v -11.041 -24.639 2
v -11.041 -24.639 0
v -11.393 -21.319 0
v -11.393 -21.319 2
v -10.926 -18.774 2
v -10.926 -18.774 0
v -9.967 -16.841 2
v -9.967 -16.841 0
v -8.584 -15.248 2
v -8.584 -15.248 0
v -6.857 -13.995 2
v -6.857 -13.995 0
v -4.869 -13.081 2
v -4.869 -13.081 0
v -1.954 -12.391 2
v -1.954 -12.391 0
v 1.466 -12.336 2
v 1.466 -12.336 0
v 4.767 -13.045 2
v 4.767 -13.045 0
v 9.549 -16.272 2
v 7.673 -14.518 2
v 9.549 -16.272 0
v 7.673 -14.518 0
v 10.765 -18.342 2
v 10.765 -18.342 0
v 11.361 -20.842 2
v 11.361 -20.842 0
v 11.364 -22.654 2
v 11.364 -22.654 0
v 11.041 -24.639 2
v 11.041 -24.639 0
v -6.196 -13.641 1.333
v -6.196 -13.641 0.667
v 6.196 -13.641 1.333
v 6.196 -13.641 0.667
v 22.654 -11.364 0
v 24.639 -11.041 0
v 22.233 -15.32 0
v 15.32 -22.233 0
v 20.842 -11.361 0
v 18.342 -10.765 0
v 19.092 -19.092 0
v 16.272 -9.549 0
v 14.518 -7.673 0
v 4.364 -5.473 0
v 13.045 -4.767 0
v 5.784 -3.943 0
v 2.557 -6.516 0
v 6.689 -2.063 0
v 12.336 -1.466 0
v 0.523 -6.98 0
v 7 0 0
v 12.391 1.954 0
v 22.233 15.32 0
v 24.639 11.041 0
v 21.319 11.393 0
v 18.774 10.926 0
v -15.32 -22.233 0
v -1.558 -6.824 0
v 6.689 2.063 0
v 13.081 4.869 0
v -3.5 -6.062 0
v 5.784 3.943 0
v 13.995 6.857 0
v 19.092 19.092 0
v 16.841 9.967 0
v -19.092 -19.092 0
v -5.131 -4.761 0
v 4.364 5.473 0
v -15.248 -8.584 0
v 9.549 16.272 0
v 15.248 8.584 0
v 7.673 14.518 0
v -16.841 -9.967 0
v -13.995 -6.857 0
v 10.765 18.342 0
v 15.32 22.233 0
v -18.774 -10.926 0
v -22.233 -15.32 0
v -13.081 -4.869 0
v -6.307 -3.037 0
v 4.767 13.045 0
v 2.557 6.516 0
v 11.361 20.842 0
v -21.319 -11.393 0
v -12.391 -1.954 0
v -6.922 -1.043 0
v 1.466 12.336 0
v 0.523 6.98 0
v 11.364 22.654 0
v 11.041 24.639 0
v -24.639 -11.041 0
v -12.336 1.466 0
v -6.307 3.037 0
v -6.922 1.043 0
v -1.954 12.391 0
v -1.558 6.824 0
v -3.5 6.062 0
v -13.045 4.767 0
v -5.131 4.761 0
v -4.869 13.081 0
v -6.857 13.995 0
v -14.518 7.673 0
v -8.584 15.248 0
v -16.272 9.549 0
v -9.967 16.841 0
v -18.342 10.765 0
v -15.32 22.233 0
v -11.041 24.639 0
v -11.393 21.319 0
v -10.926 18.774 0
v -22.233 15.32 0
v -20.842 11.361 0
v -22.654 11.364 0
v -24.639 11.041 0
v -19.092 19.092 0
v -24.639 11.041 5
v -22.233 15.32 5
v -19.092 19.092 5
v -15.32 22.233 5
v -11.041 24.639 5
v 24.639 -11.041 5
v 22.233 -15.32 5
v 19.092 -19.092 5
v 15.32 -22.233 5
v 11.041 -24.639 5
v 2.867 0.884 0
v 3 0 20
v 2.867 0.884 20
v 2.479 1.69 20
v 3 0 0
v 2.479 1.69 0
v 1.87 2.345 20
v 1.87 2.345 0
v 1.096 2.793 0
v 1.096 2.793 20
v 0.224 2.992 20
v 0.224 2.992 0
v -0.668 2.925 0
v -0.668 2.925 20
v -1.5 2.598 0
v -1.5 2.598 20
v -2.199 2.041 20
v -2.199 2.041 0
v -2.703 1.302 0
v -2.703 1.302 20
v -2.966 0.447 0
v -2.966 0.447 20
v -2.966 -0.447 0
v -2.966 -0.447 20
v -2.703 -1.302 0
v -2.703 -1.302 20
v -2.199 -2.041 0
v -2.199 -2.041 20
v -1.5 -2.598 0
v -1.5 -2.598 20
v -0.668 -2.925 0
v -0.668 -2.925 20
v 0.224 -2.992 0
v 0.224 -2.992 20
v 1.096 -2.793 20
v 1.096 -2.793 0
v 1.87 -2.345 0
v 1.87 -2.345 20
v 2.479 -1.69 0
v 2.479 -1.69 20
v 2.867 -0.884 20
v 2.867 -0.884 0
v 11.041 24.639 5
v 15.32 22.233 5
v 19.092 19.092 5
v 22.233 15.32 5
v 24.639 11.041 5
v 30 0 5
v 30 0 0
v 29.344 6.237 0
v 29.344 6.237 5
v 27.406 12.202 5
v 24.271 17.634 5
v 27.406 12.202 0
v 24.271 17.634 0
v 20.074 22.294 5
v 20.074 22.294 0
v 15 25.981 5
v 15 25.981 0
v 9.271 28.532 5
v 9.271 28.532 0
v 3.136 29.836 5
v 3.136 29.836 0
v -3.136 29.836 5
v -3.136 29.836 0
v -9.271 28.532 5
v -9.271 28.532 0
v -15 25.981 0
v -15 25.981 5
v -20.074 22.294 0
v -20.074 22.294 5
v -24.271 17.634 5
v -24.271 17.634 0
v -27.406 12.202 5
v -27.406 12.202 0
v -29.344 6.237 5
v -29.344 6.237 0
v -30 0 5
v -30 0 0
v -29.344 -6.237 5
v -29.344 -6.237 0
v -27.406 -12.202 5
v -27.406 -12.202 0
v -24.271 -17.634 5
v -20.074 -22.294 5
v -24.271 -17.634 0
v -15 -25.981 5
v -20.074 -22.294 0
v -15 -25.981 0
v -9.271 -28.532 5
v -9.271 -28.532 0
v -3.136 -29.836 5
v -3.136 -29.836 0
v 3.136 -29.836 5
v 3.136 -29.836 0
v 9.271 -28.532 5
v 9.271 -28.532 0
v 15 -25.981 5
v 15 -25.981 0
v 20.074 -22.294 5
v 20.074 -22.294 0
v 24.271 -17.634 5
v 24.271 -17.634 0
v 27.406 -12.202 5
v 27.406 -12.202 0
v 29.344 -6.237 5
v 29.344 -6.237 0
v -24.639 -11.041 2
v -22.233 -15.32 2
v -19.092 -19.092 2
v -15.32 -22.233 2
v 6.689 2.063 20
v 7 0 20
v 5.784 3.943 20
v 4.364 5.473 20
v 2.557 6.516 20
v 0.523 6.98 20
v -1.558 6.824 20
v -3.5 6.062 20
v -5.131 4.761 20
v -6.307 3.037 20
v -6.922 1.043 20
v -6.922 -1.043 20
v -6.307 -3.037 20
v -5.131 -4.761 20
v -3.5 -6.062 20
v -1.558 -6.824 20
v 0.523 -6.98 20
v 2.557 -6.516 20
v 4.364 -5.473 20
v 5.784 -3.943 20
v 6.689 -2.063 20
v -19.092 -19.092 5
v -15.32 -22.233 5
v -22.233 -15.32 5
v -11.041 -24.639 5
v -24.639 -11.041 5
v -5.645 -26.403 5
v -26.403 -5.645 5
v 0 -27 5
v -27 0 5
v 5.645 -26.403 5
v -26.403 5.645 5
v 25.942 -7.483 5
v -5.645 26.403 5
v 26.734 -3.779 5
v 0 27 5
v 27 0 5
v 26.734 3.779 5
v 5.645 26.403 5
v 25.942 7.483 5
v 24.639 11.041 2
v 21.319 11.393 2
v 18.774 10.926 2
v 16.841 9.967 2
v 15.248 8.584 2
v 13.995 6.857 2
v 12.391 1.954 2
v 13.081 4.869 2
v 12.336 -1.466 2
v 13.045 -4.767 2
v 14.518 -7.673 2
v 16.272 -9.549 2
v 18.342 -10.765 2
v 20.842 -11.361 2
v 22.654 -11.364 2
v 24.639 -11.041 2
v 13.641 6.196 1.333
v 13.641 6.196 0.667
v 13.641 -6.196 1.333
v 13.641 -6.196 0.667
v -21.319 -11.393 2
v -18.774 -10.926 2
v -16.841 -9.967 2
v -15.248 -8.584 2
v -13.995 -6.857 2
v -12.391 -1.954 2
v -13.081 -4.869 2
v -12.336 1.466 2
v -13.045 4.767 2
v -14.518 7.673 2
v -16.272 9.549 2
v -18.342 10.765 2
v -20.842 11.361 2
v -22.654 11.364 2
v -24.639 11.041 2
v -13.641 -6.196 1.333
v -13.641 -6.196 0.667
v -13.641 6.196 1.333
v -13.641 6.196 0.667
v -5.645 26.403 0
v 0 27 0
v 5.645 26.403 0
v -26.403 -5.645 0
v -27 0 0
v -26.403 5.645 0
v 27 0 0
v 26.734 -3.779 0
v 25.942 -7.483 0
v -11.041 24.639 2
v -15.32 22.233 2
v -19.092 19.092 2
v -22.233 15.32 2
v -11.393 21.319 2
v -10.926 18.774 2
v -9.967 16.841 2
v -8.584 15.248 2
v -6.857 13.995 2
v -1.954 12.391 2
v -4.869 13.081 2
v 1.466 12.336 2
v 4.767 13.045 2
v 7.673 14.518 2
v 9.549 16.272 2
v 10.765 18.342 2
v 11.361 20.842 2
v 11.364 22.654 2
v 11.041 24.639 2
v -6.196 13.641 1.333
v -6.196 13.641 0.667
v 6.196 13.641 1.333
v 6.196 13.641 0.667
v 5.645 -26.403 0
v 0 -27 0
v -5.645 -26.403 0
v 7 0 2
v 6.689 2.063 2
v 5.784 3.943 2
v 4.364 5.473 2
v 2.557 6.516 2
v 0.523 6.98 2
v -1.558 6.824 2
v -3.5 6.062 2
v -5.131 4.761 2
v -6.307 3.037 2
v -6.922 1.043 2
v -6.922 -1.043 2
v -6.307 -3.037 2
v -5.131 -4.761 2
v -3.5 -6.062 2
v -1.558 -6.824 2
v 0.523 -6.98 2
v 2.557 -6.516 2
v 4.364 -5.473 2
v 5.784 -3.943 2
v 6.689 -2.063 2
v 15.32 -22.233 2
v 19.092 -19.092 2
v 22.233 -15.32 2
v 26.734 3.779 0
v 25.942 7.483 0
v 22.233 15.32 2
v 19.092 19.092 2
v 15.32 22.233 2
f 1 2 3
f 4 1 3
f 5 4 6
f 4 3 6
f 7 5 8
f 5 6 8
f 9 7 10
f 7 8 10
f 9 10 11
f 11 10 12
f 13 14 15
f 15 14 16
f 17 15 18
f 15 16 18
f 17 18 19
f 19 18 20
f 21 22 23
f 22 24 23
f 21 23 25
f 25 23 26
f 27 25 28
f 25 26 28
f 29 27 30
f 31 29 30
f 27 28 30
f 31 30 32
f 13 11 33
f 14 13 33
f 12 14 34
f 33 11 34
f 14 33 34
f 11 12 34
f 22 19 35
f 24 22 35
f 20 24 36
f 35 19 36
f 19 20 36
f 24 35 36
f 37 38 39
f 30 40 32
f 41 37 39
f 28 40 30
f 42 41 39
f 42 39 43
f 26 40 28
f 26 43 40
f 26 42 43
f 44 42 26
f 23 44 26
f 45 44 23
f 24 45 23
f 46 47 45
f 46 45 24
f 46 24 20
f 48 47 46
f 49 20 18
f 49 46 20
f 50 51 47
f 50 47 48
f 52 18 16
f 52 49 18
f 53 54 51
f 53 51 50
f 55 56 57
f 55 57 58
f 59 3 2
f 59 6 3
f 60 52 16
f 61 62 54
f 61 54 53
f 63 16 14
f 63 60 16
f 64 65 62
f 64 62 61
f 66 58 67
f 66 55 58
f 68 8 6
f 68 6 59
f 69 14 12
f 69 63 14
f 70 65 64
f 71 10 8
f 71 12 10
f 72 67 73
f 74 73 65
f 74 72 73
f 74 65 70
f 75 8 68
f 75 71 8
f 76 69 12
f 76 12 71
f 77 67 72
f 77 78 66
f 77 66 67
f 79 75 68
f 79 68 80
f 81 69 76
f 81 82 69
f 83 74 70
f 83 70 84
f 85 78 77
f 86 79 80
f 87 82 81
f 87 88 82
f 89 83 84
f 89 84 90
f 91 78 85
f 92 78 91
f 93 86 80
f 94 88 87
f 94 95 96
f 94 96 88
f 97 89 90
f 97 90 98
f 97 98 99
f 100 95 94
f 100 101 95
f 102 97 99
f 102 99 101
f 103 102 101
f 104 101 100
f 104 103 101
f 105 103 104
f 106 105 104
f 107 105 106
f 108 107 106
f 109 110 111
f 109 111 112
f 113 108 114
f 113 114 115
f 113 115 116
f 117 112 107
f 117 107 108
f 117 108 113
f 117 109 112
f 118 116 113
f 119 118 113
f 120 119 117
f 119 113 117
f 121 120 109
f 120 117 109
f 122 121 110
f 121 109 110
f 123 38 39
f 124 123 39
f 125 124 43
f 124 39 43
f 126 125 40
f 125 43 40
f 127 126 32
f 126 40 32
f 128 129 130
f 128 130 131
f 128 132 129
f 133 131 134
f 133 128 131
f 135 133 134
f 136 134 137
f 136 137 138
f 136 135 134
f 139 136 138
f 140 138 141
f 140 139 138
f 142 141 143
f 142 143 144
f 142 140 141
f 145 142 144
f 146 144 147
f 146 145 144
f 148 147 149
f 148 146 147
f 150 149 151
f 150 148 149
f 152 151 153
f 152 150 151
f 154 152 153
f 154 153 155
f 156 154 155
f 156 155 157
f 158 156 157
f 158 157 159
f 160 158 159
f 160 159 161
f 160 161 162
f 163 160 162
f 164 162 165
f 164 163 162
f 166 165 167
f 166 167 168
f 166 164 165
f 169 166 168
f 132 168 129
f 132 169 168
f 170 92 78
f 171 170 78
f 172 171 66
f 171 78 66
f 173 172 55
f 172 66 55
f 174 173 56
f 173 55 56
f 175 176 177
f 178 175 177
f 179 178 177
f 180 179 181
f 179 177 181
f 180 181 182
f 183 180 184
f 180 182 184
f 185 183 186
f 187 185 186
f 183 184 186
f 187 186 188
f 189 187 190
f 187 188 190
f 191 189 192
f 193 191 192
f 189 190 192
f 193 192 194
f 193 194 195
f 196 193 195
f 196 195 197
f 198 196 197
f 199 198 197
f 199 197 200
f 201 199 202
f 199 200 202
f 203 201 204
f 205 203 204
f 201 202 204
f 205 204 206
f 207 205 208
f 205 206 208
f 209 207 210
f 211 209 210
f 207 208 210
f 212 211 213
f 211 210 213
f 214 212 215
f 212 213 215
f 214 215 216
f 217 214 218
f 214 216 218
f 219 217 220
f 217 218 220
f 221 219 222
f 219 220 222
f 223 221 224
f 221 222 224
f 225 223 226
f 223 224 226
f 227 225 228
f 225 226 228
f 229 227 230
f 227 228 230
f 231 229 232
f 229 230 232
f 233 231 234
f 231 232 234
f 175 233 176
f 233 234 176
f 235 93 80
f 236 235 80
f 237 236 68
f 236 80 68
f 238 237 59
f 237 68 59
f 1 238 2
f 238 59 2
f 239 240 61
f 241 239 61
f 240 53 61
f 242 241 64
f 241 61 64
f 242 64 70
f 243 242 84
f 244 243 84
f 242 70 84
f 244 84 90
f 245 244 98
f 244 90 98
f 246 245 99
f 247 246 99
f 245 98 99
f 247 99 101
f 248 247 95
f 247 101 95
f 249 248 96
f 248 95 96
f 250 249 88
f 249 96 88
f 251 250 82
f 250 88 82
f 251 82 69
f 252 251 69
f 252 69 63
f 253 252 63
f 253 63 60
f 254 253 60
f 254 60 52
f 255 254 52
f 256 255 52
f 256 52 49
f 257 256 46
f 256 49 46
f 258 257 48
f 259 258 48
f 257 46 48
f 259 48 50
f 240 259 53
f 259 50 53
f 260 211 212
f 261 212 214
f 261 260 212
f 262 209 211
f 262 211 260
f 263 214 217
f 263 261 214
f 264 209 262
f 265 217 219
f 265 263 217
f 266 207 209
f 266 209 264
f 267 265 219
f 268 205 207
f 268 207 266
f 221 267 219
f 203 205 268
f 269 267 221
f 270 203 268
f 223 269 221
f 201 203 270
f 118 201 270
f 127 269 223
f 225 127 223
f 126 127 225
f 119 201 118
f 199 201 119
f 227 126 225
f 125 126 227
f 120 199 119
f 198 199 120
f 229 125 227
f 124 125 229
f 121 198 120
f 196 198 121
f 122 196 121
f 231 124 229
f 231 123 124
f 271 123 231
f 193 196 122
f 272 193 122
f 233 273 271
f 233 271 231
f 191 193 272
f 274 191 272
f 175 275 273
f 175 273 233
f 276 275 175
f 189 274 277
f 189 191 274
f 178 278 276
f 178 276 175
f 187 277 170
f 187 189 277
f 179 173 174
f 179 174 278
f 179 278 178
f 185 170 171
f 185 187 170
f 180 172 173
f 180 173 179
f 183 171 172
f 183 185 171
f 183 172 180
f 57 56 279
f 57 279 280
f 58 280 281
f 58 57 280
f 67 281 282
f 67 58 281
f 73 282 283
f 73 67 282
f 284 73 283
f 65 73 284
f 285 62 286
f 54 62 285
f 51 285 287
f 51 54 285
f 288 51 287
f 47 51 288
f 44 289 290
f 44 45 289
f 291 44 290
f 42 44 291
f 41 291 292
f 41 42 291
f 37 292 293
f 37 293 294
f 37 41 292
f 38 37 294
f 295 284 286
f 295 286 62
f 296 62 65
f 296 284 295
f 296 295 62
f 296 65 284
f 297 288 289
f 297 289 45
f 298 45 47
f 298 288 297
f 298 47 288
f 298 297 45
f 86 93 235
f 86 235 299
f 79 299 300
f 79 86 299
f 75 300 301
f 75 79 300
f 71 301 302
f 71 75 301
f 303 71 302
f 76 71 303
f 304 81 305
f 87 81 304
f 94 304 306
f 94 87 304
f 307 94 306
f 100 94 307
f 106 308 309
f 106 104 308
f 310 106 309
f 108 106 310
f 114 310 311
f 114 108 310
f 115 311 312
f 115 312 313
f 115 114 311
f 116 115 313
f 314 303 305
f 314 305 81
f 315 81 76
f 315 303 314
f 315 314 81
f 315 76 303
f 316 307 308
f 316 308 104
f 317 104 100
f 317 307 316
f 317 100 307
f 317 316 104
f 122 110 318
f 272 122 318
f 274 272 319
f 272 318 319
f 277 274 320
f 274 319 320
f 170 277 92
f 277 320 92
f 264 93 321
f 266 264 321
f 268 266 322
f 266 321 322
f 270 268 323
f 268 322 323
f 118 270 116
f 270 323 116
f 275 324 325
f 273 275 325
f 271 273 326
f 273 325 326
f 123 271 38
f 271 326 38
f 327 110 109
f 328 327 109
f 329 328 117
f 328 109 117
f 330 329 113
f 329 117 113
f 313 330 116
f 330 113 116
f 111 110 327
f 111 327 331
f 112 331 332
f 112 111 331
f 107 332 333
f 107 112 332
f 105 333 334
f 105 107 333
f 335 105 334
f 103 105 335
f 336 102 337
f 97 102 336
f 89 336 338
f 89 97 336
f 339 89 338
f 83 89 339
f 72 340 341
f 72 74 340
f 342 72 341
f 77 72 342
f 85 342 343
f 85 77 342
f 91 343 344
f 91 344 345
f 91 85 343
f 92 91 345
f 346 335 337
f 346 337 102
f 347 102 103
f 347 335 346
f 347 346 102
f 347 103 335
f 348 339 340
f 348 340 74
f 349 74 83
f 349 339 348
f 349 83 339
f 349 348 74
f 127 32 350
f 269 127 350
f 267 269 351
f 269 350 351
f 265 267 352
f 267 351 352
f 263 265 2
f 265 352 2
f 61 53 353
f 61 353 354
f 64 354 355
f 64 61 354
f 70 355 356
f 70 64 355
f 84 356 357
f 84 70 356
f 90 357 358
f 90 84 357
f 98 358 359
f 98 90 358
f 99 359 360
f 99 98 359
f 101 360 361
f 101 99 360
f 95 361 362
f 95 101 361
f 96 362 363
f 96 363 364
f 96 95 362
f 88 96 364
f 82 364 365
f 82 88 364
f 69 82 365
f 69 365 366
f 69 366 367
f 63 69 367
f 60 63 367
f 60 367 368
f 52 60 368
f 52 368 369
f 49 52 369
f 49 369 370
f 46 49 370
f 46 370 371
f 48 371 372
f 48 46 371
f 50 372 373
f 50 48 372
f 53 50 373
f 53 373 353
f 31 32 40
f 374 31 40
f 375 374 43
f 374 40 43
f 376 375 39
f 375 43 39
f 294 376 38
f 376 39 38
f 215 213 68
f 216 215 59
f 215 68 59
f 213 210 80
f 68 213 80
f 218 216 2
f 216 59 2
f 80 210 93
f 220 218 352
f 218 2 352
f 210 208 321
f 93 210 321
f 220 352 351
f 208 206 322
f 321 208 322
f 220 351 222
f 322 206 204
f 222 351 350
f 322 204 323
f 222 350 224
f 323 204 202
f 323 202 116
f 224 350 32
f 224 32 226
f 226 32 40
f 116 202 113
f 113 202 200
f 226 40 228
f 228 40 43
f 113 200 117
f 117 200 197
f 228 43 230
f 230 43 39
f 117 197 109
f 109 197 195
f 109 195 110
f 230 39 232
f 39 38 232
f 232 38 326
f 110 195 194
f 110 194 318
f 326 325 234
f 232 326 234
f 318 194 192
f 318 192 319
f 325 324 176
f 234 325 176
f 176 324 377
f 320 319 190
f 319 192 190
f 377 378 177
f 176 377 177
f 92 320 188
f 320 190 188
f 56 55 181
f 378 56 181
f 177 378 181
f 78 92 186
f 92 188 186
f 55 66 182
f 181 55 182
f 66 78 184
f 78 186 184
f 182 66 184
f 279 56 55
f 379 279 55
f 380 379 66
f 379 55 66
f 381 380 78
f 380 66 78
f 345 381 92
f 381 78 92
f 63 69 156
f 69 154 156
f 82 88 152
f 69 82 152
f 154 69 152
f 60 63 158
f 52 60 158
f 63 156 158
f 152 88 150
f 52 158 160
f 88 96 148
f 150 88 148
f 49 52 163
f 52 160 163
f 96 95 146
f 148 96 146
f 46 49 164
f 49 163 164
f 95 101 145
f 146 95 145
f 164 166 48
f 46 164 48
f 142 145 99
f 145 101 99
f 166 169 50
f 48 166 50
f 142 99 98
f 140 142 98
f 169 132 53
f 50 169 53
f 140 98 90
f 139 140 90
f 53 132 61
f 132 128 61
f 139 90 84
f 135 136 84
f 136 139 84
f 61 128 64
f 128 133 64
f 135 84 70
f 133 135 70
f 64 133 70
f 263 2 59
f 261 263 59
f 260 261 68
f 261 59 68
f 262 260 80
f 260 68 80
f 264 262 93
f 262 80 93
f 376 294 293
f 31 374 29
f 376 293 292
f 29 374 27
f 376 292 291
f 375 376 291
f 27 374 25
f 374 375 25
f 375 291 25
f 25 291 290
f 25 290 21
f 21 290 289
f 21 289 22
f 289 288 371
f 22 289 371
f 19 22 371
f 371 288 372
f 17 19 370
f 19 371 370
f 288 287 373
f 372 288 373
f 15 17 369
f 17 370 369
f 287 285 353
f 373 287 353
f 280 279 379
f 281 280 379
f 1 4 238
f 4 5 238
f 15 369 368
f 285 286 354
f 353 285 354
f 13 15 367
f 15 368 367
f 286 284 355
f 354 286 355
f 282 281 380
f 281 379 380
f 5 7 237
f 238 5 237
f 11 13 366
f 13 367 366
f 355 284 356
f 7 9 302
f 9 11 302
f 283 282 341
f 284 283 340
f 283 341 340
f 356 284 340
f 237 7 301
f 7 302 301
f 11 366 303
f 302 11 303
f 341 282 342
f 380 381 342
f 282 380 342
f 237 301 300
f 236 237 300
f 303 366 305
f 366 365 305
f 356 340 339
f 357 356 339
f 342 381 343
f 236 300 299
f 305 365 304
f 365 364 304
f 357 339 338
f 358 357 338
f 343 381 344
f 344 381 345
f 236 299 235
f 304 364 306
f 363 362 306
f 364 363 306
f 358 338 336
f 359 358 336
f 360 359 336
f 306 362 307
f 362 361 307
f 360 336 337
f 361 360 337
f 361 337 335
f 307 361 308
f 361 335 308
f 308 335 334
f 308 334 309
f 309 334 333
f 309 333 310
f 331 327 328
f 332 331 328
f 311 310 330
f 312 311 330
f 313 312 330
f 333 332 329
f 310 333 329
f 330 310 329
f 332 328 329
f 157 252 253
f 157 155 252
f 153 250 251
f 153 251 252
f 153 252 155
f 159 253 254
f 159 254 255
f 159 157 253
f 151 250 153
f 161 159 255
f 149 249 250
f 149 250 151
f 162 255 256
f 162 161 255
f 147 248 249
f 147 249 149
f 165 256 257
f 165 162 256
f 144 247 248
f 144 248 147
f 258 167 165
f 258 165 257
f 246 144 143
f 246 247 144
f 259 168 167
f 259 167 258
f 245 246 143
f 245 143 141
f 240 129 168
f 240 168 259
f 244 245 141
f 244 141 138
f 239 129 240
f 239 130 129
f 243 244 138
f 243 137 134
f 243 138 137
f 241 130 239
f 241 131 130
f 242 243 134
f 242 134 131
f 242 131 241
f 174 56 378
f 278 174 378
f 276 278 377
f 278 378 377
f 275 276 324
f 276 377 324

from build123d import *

# Parameters (mm, degrees)
F0_R     = 30
F1_DEPTH = 5
F0_R_2   = 7
F0_R_3   = 3
F2_DEPTH = 2
F3_DEPTH = 15


# Not quite as in the source:
# - a feature names something its author has since deleted; it is built from what else it names


with BuildPart() as f1:
    # F0 (on Top) → F1 (new body)
    with BuildSketch(Plane.XY):
        Circle(F0_R)
        with BuildLine():
            ThreePointArc((24.6394529882, 11.040713584), (26.4032690275, 5.6451204292), (27, 0))
            ThreePointArc((27, 0), (26.4032690275, -5.6451204292), (24.6394529882, -11.040713584))
            ThreePointArc((24.6394529882, -11.040713584), (19.091883092, -19.091883092), (11.040713584, -24.6394529882))
            ThreePointArc((11.040713584, -24.6394529882), (0, -27), (-11.040713584, -24.6394529882))
            ThreePointArc((-11.040713584, -24.6394529882), (-19.091883092, -19.091883092), (-24.6394529882, -11.040713584))
            ThreePointArc((-24.6394529882, -11.040713584), (-27, 0), (-24.6394529882, 11.040713584))
            ThreePointArc((-24.6394529882, 11.040713584), (-19.091883092, 19.091883092), (-11.040713584, 24.6394529882))
            ThreePointArc((-11.040713584, 24.6394529882), (0, 27), (11.040713584, 24.6394529882))
            ThreePointArc((11.040713584, 24.6394529882), (19.091883092, 19.091883092), (24.6394529882, 11.040713584))
        make_face(mode=Mode.SUBTRACT)
    extrude(amount=F1_DEPTH)


with BuildPart() as f1b:
    # F0 (on Top) → F1, piece 2 (new body)
    with BuildSketch(Plane.XY):
        Circle(F0_R_2)
        Circle(F0_R_3, mode=Mode.SUBTRACT)
    extrude(amount=F1_DEPTH)

    # F3 (add): a face of the model
    f3_faces = [f1b.faces().sort_by_distance(p)[0] for p in [
        (-6.8020101013, 0, 5),
    ]]
    extrude(f3_faces, amount=F3_DEPTH)


with BuildPart() as f2:
    # F0 (on Top) → F2 (new body)
    with BuildSketch(Plane.XY):
        with BuildLine():
            add(Edge.make_bspline(
                [(24.6394529882, 11.040713584), (8.1415599535, 15), (8.1415599535, -15), (24.6394529882, -11.040713584)],
                knots=[0, 0, 0, 0, 22.081427168, 22.081427168, 22.081427168, 22.081427168], degree=3))
            ThreePointArc((24.6394529882, 11.040713584), (19.091883092, 19.091883092), (11.040713584, 24.6394529882))
            add(Edge.make_bspline(
                [(-11.040713584, 24.6394529882), (-15, 8.1415599535), (15, 8.1415599535), (11.040713584, 24.6394529882)],
                knots=[0, 0, 0, 0, 22.081427168, 22.081427168, 22.081427168, 22.081427168], degree=3))
            ThreePointArc((-11.040713584, 24.6394529882), (-19.091883092, 19.091883092), (-24.6394529882, 11.040713584))
            add(Edge.make_bspline(
                [(-24.6394529882, -11.040713584), (-8.1415599535, -15), (-8.1415599535, 15), (-24.6394529882, 11.040713584)],
                knots=[0, 0, 0, 0, 22.081427168, 22.081427168, 22.081427168, 22.081427168], degree=3))
            ThreePointArc((-24.6394529882, -11.040713584), (-19.091883092, -19.091883092), (-11.040713584, -24.6394529882))
            add(Edge.make_bspline(
                [(-11.040713584, -24.6394529882), (-15, -8.1415599535), (15, -8.1415599535), (11.040713584, -24.6394529882)],
                knots=[0, 0, 0, 0, 22.081427168, 22.081427168, 22.081427168, 22.081427168], degree=3))
            ThreePointArc((11.040713584, -24.6394529882), (19.091883092, -19.091883092), (24.6394529882, -11.040713584))
        make_face()
        Circle(F0_R_2, mode=Mode.SUBTRACT)
    extrude(amount=F2_DEPTH)


solid = Compound([f1.part, f1b.part, f2.part])
